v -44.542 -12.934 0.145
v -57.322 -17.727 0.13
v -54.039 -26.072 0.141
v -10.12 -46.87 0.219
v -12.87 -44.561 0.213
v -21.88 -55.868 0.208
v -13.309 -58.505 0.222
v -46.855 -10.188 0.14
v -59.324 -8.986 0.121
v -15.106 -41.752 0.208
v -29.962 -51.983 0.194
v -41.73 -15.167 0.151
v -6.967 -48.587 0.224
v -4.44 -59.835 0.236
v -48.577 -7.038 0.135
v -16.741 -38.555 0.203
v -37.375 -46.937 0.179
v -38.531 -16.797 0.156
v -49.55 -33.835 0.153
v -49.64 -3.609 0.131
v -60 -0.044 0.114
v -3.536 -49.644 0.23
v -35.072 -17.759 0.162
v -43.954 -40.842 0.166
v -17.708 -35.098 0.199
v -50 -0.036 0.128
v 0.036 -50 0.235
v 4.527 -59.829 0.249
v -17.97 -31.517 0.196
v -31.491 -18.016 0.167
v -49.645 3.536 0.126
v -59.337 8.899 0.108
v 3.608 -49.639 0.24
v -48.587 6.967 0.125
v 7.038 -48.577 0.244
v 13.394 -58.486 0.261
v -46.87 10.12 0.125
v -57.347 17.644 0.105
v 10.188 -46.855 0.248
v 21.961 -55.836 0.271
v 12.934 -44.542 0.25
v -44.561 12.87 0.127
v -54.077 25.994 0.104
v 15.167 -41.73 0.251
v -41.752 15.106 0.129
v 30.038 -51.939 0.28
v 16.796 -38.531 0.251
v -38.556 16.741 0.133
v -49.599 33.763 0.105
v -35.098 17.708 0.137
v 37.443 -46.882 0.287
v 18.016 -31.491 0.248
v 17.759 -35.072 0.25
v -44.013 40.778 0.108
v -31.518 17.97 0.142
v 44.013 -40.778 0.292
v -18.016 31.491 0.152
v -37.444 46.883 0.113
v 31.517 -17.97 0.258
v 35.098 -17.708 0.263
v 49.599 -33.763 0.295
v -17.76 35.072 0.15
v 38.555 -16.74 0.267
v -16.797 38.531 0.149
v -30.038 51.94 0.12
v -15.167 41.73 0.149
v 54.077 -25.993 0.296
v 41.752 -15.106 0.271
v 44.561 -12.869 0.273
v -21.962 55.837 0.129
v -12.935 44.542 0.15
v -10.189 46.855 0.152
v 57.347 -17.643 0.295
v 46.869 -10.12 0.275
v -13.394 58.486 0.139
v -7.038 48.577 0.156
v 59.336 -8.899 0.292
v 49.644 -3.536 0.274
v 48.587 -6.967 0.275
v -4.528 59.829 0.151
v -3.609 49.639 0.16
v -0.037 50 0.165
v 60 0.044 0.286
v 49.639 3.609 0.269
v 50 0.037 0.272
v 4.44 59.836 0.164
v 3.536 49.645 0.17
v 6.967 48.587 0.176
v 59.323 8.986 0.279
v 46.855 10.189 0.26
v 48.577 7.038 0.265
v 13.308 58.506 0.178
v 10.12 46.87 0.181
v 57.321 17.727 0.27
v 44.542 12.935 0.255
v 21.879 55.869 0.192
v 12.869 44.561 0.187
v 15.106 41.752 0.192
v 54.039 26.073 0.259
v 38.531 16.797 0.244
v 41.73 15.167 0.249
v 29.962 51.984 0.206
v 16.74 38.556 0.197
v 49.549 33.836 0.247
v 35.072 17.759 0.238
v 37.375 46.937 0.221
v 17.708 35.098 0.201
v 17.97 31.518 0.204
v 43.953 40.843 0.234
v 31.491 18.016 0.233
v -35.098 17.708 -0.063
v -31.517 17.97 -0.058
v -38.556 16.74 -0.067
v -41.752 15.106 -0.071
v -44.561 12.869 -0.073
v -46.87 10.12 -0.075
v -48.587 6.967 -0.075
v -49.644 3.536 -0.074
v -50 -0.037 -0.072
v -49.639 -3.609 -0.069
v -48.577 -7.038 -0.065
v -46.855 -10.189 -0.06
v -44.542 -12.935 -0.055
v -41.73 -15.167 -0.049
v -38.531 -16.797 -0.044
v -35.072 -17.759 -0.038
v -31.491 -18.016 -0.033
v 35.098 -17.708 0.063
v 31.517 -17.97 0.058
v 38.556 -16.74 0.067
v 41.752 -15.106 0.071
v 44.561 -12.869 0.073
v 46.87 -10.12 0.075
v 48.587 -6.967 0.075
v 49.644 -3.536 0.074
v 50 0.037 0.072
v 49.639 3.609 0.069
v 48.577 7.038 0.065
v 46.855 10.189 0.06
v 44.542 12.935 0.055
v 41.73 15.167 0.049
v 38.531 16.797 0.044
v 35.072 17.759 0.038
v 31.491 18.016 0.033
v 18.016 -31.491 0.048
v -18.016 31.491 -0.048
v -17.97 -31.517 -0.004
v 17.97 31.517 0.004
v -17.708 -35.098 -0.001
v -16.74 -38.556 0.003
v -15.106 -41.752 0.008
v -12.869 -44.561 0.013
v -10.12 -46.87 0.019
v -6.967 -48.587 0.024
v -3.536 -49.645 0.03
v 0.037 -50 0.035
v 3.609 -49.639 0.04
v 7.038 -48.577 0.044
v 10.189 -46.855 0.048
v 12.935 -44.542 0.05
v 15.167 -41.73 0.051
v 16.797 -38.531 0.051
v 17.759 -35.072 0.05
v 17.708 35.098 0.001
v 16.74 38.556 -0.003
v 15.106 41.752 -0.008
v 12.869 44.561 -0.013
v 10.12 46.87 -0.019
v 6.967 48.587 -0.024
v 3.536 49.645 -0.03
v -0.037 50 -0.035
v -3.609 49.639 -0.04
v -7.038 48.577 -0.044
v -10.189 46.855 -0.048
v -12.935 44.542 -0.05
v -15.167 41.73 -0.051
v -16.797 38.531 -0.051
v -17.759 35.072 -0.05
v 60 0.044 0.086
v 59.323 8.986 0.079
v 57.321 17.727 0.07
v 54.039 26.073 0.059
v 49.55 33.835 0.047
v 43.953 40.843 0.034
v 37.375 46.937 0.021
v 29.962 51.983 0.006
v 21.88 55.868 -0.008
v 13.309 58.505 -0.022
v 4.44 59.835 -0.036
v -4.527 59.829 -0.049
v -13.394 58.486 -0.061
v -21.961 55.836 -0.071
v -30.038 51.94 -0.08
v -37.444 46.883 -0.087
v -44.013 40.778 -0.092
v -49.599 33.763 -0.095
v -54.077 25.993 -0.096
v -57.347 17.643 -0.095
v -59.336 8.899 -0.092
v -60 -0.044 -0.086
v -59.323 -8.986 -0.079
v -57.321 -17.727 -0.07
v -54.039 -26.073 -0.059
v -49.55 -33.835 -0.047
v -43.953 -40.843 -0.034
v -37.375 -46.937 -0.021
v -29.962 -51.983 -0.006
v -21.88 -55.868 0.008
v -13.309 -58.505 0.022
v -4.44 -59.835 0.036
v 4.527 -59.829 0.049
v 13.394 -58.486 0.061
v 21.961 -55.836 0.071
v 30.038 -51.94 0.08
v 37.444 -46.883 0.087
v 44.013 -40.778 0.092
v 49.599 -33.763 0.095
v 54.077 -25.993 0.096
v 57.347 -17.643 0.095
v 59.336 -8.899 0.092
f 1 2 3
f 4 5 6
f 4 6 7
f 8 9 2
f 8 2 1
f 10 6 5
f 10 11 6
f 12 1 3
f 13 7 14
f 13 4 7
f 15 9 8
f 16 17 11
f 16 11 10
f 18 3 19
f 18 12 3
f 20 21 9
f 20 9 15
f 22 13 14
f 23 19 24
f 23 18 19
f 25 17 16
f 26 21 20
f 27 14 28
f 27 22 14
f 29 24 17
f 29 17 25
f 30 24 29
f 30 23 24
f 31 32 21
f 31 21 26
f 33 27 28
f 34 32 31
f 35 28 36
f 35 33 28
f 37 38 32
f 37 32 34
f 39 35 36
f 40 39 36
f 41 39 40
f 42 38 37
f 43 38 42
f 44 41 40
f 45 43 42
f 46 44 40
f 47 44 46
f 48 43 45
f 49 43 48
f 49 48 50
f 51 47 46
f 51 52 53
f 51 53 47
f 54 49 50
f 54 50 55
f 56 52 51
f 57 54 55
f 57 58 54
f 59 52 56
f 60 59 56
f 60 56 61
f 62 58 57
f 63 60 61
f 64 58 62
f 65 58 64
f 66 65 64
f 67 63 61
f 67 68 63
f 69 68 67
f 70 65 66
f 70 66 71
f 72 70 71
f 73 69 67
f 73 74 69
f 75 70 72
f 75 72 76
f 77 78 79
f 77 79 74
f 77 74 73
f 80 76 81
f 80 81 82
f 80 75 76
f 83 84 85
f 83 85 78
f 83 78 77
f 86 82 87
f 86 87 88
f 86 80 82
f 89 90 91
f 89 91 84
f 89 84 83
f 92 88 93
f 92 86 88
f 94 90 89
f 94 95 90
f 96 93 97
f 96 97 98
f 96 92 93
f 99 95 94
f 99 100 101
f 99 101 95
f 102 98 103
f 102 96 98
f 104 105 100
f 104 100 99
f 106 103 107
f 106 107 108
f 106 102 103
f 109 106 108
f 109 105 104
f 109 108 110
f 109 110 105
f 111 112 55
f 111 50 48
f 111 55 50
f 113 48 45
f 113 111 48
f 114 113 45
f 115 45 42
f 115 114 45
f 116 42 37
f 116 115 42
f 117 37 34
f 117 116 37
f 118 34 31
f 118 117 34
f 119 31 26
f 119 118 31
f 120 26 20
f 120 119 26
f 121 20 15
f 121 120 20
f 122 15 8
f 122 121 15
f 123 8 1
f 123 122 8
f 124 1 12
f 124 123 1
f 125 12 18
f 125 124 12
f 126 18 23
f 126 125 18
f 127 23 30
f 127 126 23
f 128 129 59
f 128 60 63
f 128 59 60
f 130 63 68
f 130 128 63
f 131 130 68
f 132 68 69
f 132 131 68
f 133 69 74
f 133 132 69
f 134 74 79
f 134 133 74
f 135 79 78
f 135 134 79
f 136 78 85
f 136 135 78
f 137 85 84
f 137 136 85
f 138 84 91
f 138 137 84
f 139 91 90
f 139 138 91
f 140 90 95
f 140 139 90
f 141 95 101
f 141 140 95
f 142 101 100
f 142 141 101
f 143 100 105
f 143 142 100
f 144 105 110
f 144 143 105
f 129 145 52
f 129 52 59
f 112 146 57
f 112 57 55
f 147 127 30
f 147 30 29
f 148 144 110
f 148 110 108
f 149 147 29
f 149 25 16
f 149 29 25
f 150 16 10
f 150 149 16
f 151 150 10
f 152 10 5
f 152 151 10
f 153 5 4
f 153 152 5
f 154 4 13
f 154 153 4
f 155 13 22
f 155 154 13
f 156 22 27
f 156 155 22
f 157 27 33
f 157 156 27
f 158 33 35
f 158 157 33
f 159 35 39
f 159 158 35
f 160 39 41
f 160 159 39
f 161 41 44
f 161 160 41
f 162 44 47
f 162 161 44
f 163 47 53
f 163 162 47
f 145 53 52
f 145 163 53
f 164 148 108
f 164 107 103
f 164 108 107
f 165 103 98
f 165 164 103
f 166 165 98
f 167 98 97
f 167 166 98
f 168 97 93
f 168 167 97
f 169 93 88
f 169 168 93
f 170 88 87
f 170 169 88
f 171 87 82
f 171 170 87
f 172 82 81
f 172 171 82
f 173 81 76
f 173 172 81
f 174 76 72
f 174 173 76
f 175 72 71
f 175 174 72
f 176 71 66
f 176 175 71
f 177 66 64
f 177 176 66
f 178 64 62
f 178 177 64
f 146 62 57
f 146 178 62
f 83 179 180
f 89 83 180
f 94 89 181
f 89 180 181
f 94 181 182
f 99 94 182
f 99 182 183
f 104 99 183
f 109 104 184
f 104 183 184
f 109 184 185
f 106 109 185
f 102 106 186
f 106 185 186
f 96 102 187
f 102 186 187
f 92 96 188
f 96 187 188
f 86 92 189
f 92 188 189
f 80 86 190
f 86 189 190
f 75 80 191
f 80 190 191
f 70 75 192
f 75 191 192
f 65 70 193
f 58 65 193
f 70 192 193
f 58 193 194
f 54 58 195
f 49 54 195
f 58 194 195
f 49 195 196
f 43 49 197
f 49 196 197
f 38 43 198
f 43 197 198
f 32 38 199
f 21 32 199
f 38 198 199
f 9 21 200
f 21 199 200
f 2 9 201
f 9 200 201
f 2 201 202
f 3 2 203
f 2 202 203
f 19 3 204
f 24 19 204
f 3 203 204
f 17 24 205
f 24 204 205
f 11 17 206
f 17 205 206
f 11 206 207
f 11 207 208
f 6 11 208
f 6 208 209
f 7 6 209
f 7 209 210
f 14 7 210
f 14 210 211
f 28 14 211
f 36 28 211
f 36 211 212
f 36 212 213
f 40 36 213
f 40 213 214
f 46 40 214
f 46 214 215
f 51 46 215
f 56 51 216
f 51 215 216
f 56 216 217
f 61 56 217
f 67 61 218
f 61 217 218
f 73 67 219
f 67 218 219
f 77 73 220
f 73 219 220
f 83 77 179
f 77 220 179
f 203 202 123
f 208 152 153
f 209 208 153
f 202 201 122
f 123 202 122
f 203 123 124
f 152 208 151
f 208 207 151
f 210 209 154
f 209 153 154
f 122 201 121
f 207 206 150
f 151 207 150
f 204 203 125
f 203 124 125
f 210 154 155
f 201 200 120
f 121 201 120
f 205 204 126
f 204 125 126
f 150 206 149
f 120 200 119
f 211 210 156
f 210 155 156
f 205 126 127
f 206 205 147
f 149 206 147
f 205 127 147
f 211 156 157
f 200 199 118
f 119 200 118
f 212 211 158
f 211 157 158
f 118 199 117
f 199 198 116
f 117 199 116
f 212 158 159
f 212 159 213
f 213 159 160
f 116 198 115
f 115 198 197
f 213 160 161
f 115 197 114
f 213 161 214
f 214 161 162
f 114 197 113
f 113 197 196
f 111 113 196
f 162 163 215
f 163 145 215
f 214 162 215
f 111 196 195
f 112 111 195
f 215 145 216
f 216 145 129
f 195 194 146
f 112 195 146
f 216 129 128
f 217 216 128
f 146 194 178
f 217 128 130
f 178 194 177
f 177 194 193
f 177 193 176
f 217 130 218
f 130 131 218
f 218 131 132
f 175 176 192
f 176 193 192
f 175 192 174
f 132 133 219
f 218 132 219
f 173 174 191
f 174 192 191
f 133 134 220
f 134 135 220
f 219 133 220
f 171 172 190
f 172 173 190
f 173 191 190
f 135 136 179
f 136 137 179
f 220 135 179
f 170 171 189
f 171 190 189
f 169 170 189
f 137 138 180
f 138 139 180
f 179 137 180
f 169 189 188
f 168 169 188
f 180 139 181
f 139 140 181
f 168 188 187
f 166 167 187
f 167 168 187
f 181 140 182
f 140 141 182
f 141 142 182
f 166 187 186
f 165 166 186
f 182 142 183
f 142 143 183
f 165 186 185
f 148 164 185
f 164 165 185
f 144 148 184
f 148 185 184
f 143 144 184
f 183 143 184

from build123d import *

# Parameters (mm, degrees)
PAD_DEPTH           = 10
CYLINDER_R          = 60
CYLINDER_DEPTH      = 0.2
CUT_ROLL_ANGLE      = -0.040537
CUT_PITCH_ANGLE     = -0.082331
CUT_PLACEMENT_ANGLE = 0.041901


with BuildPart() as pad:
    # Sketch → Pad (new body)
    with BuildSketch(Plane.XY):
        with BuildLine():
            ThreePointArc((31.504301, -17.993173), (50, 0), (31.504301, 17.993173))
            Line((31.504301, 17.993173), (17.993173, 31.504301))
            ThreePointArc((17.993173, 31.504301), (0, 50), (-17.993173, 31.504301))
            Line((-17.993173, 31.504301), (-31.504301, 17.993173))
            ThreePointArc((-31.504301, 17.993173), (-50, 0), (-31.504301, -17.993173))
            Line((-31.504301, -17.993173), (-17.993173, -31.504301))
            ThreePointArc((-17.993173, -31.504301), (0, -50), (17.993173, -31.504301))
            Line((17.993173, -31.504301), (31.504301, -17.993173))
        make_face()
    extrude(amount=PAD_DEPTH)


with BuildPart() as cut:
    # Cylinder → Cylinder (new body)
    with BuildSketch(Plane.XY):
        Circle(CYLINDER_R)
    extrude(amount=CYLINDER_DEPTH)

    # Cut: cut Pad
    add(pad.part, mode=Mode.SUBTRACT)


with BuildPart() as cut_1:
    # Cut roll: moved
    add(cut.part.rotate(Axis((0, 0, 0), (1, 0, 0)), CUT_ROLL_ANGLE))


with BuildPart() as cut_2:
    # Cut pitch: moved
    add(cut_1.part.rotate(Axis((0, 0, 0), (0, 1, 0)), CUT_PITCH_ANGLE))


with BuildPart() as cut_3:
    # Cut placement: moved
    add(cut_2.part.rotate(Axis((0, 0, 0), (0, 0, 1)), CUT_PLACEMENT_ANGLE))


solid = cut_3.part
